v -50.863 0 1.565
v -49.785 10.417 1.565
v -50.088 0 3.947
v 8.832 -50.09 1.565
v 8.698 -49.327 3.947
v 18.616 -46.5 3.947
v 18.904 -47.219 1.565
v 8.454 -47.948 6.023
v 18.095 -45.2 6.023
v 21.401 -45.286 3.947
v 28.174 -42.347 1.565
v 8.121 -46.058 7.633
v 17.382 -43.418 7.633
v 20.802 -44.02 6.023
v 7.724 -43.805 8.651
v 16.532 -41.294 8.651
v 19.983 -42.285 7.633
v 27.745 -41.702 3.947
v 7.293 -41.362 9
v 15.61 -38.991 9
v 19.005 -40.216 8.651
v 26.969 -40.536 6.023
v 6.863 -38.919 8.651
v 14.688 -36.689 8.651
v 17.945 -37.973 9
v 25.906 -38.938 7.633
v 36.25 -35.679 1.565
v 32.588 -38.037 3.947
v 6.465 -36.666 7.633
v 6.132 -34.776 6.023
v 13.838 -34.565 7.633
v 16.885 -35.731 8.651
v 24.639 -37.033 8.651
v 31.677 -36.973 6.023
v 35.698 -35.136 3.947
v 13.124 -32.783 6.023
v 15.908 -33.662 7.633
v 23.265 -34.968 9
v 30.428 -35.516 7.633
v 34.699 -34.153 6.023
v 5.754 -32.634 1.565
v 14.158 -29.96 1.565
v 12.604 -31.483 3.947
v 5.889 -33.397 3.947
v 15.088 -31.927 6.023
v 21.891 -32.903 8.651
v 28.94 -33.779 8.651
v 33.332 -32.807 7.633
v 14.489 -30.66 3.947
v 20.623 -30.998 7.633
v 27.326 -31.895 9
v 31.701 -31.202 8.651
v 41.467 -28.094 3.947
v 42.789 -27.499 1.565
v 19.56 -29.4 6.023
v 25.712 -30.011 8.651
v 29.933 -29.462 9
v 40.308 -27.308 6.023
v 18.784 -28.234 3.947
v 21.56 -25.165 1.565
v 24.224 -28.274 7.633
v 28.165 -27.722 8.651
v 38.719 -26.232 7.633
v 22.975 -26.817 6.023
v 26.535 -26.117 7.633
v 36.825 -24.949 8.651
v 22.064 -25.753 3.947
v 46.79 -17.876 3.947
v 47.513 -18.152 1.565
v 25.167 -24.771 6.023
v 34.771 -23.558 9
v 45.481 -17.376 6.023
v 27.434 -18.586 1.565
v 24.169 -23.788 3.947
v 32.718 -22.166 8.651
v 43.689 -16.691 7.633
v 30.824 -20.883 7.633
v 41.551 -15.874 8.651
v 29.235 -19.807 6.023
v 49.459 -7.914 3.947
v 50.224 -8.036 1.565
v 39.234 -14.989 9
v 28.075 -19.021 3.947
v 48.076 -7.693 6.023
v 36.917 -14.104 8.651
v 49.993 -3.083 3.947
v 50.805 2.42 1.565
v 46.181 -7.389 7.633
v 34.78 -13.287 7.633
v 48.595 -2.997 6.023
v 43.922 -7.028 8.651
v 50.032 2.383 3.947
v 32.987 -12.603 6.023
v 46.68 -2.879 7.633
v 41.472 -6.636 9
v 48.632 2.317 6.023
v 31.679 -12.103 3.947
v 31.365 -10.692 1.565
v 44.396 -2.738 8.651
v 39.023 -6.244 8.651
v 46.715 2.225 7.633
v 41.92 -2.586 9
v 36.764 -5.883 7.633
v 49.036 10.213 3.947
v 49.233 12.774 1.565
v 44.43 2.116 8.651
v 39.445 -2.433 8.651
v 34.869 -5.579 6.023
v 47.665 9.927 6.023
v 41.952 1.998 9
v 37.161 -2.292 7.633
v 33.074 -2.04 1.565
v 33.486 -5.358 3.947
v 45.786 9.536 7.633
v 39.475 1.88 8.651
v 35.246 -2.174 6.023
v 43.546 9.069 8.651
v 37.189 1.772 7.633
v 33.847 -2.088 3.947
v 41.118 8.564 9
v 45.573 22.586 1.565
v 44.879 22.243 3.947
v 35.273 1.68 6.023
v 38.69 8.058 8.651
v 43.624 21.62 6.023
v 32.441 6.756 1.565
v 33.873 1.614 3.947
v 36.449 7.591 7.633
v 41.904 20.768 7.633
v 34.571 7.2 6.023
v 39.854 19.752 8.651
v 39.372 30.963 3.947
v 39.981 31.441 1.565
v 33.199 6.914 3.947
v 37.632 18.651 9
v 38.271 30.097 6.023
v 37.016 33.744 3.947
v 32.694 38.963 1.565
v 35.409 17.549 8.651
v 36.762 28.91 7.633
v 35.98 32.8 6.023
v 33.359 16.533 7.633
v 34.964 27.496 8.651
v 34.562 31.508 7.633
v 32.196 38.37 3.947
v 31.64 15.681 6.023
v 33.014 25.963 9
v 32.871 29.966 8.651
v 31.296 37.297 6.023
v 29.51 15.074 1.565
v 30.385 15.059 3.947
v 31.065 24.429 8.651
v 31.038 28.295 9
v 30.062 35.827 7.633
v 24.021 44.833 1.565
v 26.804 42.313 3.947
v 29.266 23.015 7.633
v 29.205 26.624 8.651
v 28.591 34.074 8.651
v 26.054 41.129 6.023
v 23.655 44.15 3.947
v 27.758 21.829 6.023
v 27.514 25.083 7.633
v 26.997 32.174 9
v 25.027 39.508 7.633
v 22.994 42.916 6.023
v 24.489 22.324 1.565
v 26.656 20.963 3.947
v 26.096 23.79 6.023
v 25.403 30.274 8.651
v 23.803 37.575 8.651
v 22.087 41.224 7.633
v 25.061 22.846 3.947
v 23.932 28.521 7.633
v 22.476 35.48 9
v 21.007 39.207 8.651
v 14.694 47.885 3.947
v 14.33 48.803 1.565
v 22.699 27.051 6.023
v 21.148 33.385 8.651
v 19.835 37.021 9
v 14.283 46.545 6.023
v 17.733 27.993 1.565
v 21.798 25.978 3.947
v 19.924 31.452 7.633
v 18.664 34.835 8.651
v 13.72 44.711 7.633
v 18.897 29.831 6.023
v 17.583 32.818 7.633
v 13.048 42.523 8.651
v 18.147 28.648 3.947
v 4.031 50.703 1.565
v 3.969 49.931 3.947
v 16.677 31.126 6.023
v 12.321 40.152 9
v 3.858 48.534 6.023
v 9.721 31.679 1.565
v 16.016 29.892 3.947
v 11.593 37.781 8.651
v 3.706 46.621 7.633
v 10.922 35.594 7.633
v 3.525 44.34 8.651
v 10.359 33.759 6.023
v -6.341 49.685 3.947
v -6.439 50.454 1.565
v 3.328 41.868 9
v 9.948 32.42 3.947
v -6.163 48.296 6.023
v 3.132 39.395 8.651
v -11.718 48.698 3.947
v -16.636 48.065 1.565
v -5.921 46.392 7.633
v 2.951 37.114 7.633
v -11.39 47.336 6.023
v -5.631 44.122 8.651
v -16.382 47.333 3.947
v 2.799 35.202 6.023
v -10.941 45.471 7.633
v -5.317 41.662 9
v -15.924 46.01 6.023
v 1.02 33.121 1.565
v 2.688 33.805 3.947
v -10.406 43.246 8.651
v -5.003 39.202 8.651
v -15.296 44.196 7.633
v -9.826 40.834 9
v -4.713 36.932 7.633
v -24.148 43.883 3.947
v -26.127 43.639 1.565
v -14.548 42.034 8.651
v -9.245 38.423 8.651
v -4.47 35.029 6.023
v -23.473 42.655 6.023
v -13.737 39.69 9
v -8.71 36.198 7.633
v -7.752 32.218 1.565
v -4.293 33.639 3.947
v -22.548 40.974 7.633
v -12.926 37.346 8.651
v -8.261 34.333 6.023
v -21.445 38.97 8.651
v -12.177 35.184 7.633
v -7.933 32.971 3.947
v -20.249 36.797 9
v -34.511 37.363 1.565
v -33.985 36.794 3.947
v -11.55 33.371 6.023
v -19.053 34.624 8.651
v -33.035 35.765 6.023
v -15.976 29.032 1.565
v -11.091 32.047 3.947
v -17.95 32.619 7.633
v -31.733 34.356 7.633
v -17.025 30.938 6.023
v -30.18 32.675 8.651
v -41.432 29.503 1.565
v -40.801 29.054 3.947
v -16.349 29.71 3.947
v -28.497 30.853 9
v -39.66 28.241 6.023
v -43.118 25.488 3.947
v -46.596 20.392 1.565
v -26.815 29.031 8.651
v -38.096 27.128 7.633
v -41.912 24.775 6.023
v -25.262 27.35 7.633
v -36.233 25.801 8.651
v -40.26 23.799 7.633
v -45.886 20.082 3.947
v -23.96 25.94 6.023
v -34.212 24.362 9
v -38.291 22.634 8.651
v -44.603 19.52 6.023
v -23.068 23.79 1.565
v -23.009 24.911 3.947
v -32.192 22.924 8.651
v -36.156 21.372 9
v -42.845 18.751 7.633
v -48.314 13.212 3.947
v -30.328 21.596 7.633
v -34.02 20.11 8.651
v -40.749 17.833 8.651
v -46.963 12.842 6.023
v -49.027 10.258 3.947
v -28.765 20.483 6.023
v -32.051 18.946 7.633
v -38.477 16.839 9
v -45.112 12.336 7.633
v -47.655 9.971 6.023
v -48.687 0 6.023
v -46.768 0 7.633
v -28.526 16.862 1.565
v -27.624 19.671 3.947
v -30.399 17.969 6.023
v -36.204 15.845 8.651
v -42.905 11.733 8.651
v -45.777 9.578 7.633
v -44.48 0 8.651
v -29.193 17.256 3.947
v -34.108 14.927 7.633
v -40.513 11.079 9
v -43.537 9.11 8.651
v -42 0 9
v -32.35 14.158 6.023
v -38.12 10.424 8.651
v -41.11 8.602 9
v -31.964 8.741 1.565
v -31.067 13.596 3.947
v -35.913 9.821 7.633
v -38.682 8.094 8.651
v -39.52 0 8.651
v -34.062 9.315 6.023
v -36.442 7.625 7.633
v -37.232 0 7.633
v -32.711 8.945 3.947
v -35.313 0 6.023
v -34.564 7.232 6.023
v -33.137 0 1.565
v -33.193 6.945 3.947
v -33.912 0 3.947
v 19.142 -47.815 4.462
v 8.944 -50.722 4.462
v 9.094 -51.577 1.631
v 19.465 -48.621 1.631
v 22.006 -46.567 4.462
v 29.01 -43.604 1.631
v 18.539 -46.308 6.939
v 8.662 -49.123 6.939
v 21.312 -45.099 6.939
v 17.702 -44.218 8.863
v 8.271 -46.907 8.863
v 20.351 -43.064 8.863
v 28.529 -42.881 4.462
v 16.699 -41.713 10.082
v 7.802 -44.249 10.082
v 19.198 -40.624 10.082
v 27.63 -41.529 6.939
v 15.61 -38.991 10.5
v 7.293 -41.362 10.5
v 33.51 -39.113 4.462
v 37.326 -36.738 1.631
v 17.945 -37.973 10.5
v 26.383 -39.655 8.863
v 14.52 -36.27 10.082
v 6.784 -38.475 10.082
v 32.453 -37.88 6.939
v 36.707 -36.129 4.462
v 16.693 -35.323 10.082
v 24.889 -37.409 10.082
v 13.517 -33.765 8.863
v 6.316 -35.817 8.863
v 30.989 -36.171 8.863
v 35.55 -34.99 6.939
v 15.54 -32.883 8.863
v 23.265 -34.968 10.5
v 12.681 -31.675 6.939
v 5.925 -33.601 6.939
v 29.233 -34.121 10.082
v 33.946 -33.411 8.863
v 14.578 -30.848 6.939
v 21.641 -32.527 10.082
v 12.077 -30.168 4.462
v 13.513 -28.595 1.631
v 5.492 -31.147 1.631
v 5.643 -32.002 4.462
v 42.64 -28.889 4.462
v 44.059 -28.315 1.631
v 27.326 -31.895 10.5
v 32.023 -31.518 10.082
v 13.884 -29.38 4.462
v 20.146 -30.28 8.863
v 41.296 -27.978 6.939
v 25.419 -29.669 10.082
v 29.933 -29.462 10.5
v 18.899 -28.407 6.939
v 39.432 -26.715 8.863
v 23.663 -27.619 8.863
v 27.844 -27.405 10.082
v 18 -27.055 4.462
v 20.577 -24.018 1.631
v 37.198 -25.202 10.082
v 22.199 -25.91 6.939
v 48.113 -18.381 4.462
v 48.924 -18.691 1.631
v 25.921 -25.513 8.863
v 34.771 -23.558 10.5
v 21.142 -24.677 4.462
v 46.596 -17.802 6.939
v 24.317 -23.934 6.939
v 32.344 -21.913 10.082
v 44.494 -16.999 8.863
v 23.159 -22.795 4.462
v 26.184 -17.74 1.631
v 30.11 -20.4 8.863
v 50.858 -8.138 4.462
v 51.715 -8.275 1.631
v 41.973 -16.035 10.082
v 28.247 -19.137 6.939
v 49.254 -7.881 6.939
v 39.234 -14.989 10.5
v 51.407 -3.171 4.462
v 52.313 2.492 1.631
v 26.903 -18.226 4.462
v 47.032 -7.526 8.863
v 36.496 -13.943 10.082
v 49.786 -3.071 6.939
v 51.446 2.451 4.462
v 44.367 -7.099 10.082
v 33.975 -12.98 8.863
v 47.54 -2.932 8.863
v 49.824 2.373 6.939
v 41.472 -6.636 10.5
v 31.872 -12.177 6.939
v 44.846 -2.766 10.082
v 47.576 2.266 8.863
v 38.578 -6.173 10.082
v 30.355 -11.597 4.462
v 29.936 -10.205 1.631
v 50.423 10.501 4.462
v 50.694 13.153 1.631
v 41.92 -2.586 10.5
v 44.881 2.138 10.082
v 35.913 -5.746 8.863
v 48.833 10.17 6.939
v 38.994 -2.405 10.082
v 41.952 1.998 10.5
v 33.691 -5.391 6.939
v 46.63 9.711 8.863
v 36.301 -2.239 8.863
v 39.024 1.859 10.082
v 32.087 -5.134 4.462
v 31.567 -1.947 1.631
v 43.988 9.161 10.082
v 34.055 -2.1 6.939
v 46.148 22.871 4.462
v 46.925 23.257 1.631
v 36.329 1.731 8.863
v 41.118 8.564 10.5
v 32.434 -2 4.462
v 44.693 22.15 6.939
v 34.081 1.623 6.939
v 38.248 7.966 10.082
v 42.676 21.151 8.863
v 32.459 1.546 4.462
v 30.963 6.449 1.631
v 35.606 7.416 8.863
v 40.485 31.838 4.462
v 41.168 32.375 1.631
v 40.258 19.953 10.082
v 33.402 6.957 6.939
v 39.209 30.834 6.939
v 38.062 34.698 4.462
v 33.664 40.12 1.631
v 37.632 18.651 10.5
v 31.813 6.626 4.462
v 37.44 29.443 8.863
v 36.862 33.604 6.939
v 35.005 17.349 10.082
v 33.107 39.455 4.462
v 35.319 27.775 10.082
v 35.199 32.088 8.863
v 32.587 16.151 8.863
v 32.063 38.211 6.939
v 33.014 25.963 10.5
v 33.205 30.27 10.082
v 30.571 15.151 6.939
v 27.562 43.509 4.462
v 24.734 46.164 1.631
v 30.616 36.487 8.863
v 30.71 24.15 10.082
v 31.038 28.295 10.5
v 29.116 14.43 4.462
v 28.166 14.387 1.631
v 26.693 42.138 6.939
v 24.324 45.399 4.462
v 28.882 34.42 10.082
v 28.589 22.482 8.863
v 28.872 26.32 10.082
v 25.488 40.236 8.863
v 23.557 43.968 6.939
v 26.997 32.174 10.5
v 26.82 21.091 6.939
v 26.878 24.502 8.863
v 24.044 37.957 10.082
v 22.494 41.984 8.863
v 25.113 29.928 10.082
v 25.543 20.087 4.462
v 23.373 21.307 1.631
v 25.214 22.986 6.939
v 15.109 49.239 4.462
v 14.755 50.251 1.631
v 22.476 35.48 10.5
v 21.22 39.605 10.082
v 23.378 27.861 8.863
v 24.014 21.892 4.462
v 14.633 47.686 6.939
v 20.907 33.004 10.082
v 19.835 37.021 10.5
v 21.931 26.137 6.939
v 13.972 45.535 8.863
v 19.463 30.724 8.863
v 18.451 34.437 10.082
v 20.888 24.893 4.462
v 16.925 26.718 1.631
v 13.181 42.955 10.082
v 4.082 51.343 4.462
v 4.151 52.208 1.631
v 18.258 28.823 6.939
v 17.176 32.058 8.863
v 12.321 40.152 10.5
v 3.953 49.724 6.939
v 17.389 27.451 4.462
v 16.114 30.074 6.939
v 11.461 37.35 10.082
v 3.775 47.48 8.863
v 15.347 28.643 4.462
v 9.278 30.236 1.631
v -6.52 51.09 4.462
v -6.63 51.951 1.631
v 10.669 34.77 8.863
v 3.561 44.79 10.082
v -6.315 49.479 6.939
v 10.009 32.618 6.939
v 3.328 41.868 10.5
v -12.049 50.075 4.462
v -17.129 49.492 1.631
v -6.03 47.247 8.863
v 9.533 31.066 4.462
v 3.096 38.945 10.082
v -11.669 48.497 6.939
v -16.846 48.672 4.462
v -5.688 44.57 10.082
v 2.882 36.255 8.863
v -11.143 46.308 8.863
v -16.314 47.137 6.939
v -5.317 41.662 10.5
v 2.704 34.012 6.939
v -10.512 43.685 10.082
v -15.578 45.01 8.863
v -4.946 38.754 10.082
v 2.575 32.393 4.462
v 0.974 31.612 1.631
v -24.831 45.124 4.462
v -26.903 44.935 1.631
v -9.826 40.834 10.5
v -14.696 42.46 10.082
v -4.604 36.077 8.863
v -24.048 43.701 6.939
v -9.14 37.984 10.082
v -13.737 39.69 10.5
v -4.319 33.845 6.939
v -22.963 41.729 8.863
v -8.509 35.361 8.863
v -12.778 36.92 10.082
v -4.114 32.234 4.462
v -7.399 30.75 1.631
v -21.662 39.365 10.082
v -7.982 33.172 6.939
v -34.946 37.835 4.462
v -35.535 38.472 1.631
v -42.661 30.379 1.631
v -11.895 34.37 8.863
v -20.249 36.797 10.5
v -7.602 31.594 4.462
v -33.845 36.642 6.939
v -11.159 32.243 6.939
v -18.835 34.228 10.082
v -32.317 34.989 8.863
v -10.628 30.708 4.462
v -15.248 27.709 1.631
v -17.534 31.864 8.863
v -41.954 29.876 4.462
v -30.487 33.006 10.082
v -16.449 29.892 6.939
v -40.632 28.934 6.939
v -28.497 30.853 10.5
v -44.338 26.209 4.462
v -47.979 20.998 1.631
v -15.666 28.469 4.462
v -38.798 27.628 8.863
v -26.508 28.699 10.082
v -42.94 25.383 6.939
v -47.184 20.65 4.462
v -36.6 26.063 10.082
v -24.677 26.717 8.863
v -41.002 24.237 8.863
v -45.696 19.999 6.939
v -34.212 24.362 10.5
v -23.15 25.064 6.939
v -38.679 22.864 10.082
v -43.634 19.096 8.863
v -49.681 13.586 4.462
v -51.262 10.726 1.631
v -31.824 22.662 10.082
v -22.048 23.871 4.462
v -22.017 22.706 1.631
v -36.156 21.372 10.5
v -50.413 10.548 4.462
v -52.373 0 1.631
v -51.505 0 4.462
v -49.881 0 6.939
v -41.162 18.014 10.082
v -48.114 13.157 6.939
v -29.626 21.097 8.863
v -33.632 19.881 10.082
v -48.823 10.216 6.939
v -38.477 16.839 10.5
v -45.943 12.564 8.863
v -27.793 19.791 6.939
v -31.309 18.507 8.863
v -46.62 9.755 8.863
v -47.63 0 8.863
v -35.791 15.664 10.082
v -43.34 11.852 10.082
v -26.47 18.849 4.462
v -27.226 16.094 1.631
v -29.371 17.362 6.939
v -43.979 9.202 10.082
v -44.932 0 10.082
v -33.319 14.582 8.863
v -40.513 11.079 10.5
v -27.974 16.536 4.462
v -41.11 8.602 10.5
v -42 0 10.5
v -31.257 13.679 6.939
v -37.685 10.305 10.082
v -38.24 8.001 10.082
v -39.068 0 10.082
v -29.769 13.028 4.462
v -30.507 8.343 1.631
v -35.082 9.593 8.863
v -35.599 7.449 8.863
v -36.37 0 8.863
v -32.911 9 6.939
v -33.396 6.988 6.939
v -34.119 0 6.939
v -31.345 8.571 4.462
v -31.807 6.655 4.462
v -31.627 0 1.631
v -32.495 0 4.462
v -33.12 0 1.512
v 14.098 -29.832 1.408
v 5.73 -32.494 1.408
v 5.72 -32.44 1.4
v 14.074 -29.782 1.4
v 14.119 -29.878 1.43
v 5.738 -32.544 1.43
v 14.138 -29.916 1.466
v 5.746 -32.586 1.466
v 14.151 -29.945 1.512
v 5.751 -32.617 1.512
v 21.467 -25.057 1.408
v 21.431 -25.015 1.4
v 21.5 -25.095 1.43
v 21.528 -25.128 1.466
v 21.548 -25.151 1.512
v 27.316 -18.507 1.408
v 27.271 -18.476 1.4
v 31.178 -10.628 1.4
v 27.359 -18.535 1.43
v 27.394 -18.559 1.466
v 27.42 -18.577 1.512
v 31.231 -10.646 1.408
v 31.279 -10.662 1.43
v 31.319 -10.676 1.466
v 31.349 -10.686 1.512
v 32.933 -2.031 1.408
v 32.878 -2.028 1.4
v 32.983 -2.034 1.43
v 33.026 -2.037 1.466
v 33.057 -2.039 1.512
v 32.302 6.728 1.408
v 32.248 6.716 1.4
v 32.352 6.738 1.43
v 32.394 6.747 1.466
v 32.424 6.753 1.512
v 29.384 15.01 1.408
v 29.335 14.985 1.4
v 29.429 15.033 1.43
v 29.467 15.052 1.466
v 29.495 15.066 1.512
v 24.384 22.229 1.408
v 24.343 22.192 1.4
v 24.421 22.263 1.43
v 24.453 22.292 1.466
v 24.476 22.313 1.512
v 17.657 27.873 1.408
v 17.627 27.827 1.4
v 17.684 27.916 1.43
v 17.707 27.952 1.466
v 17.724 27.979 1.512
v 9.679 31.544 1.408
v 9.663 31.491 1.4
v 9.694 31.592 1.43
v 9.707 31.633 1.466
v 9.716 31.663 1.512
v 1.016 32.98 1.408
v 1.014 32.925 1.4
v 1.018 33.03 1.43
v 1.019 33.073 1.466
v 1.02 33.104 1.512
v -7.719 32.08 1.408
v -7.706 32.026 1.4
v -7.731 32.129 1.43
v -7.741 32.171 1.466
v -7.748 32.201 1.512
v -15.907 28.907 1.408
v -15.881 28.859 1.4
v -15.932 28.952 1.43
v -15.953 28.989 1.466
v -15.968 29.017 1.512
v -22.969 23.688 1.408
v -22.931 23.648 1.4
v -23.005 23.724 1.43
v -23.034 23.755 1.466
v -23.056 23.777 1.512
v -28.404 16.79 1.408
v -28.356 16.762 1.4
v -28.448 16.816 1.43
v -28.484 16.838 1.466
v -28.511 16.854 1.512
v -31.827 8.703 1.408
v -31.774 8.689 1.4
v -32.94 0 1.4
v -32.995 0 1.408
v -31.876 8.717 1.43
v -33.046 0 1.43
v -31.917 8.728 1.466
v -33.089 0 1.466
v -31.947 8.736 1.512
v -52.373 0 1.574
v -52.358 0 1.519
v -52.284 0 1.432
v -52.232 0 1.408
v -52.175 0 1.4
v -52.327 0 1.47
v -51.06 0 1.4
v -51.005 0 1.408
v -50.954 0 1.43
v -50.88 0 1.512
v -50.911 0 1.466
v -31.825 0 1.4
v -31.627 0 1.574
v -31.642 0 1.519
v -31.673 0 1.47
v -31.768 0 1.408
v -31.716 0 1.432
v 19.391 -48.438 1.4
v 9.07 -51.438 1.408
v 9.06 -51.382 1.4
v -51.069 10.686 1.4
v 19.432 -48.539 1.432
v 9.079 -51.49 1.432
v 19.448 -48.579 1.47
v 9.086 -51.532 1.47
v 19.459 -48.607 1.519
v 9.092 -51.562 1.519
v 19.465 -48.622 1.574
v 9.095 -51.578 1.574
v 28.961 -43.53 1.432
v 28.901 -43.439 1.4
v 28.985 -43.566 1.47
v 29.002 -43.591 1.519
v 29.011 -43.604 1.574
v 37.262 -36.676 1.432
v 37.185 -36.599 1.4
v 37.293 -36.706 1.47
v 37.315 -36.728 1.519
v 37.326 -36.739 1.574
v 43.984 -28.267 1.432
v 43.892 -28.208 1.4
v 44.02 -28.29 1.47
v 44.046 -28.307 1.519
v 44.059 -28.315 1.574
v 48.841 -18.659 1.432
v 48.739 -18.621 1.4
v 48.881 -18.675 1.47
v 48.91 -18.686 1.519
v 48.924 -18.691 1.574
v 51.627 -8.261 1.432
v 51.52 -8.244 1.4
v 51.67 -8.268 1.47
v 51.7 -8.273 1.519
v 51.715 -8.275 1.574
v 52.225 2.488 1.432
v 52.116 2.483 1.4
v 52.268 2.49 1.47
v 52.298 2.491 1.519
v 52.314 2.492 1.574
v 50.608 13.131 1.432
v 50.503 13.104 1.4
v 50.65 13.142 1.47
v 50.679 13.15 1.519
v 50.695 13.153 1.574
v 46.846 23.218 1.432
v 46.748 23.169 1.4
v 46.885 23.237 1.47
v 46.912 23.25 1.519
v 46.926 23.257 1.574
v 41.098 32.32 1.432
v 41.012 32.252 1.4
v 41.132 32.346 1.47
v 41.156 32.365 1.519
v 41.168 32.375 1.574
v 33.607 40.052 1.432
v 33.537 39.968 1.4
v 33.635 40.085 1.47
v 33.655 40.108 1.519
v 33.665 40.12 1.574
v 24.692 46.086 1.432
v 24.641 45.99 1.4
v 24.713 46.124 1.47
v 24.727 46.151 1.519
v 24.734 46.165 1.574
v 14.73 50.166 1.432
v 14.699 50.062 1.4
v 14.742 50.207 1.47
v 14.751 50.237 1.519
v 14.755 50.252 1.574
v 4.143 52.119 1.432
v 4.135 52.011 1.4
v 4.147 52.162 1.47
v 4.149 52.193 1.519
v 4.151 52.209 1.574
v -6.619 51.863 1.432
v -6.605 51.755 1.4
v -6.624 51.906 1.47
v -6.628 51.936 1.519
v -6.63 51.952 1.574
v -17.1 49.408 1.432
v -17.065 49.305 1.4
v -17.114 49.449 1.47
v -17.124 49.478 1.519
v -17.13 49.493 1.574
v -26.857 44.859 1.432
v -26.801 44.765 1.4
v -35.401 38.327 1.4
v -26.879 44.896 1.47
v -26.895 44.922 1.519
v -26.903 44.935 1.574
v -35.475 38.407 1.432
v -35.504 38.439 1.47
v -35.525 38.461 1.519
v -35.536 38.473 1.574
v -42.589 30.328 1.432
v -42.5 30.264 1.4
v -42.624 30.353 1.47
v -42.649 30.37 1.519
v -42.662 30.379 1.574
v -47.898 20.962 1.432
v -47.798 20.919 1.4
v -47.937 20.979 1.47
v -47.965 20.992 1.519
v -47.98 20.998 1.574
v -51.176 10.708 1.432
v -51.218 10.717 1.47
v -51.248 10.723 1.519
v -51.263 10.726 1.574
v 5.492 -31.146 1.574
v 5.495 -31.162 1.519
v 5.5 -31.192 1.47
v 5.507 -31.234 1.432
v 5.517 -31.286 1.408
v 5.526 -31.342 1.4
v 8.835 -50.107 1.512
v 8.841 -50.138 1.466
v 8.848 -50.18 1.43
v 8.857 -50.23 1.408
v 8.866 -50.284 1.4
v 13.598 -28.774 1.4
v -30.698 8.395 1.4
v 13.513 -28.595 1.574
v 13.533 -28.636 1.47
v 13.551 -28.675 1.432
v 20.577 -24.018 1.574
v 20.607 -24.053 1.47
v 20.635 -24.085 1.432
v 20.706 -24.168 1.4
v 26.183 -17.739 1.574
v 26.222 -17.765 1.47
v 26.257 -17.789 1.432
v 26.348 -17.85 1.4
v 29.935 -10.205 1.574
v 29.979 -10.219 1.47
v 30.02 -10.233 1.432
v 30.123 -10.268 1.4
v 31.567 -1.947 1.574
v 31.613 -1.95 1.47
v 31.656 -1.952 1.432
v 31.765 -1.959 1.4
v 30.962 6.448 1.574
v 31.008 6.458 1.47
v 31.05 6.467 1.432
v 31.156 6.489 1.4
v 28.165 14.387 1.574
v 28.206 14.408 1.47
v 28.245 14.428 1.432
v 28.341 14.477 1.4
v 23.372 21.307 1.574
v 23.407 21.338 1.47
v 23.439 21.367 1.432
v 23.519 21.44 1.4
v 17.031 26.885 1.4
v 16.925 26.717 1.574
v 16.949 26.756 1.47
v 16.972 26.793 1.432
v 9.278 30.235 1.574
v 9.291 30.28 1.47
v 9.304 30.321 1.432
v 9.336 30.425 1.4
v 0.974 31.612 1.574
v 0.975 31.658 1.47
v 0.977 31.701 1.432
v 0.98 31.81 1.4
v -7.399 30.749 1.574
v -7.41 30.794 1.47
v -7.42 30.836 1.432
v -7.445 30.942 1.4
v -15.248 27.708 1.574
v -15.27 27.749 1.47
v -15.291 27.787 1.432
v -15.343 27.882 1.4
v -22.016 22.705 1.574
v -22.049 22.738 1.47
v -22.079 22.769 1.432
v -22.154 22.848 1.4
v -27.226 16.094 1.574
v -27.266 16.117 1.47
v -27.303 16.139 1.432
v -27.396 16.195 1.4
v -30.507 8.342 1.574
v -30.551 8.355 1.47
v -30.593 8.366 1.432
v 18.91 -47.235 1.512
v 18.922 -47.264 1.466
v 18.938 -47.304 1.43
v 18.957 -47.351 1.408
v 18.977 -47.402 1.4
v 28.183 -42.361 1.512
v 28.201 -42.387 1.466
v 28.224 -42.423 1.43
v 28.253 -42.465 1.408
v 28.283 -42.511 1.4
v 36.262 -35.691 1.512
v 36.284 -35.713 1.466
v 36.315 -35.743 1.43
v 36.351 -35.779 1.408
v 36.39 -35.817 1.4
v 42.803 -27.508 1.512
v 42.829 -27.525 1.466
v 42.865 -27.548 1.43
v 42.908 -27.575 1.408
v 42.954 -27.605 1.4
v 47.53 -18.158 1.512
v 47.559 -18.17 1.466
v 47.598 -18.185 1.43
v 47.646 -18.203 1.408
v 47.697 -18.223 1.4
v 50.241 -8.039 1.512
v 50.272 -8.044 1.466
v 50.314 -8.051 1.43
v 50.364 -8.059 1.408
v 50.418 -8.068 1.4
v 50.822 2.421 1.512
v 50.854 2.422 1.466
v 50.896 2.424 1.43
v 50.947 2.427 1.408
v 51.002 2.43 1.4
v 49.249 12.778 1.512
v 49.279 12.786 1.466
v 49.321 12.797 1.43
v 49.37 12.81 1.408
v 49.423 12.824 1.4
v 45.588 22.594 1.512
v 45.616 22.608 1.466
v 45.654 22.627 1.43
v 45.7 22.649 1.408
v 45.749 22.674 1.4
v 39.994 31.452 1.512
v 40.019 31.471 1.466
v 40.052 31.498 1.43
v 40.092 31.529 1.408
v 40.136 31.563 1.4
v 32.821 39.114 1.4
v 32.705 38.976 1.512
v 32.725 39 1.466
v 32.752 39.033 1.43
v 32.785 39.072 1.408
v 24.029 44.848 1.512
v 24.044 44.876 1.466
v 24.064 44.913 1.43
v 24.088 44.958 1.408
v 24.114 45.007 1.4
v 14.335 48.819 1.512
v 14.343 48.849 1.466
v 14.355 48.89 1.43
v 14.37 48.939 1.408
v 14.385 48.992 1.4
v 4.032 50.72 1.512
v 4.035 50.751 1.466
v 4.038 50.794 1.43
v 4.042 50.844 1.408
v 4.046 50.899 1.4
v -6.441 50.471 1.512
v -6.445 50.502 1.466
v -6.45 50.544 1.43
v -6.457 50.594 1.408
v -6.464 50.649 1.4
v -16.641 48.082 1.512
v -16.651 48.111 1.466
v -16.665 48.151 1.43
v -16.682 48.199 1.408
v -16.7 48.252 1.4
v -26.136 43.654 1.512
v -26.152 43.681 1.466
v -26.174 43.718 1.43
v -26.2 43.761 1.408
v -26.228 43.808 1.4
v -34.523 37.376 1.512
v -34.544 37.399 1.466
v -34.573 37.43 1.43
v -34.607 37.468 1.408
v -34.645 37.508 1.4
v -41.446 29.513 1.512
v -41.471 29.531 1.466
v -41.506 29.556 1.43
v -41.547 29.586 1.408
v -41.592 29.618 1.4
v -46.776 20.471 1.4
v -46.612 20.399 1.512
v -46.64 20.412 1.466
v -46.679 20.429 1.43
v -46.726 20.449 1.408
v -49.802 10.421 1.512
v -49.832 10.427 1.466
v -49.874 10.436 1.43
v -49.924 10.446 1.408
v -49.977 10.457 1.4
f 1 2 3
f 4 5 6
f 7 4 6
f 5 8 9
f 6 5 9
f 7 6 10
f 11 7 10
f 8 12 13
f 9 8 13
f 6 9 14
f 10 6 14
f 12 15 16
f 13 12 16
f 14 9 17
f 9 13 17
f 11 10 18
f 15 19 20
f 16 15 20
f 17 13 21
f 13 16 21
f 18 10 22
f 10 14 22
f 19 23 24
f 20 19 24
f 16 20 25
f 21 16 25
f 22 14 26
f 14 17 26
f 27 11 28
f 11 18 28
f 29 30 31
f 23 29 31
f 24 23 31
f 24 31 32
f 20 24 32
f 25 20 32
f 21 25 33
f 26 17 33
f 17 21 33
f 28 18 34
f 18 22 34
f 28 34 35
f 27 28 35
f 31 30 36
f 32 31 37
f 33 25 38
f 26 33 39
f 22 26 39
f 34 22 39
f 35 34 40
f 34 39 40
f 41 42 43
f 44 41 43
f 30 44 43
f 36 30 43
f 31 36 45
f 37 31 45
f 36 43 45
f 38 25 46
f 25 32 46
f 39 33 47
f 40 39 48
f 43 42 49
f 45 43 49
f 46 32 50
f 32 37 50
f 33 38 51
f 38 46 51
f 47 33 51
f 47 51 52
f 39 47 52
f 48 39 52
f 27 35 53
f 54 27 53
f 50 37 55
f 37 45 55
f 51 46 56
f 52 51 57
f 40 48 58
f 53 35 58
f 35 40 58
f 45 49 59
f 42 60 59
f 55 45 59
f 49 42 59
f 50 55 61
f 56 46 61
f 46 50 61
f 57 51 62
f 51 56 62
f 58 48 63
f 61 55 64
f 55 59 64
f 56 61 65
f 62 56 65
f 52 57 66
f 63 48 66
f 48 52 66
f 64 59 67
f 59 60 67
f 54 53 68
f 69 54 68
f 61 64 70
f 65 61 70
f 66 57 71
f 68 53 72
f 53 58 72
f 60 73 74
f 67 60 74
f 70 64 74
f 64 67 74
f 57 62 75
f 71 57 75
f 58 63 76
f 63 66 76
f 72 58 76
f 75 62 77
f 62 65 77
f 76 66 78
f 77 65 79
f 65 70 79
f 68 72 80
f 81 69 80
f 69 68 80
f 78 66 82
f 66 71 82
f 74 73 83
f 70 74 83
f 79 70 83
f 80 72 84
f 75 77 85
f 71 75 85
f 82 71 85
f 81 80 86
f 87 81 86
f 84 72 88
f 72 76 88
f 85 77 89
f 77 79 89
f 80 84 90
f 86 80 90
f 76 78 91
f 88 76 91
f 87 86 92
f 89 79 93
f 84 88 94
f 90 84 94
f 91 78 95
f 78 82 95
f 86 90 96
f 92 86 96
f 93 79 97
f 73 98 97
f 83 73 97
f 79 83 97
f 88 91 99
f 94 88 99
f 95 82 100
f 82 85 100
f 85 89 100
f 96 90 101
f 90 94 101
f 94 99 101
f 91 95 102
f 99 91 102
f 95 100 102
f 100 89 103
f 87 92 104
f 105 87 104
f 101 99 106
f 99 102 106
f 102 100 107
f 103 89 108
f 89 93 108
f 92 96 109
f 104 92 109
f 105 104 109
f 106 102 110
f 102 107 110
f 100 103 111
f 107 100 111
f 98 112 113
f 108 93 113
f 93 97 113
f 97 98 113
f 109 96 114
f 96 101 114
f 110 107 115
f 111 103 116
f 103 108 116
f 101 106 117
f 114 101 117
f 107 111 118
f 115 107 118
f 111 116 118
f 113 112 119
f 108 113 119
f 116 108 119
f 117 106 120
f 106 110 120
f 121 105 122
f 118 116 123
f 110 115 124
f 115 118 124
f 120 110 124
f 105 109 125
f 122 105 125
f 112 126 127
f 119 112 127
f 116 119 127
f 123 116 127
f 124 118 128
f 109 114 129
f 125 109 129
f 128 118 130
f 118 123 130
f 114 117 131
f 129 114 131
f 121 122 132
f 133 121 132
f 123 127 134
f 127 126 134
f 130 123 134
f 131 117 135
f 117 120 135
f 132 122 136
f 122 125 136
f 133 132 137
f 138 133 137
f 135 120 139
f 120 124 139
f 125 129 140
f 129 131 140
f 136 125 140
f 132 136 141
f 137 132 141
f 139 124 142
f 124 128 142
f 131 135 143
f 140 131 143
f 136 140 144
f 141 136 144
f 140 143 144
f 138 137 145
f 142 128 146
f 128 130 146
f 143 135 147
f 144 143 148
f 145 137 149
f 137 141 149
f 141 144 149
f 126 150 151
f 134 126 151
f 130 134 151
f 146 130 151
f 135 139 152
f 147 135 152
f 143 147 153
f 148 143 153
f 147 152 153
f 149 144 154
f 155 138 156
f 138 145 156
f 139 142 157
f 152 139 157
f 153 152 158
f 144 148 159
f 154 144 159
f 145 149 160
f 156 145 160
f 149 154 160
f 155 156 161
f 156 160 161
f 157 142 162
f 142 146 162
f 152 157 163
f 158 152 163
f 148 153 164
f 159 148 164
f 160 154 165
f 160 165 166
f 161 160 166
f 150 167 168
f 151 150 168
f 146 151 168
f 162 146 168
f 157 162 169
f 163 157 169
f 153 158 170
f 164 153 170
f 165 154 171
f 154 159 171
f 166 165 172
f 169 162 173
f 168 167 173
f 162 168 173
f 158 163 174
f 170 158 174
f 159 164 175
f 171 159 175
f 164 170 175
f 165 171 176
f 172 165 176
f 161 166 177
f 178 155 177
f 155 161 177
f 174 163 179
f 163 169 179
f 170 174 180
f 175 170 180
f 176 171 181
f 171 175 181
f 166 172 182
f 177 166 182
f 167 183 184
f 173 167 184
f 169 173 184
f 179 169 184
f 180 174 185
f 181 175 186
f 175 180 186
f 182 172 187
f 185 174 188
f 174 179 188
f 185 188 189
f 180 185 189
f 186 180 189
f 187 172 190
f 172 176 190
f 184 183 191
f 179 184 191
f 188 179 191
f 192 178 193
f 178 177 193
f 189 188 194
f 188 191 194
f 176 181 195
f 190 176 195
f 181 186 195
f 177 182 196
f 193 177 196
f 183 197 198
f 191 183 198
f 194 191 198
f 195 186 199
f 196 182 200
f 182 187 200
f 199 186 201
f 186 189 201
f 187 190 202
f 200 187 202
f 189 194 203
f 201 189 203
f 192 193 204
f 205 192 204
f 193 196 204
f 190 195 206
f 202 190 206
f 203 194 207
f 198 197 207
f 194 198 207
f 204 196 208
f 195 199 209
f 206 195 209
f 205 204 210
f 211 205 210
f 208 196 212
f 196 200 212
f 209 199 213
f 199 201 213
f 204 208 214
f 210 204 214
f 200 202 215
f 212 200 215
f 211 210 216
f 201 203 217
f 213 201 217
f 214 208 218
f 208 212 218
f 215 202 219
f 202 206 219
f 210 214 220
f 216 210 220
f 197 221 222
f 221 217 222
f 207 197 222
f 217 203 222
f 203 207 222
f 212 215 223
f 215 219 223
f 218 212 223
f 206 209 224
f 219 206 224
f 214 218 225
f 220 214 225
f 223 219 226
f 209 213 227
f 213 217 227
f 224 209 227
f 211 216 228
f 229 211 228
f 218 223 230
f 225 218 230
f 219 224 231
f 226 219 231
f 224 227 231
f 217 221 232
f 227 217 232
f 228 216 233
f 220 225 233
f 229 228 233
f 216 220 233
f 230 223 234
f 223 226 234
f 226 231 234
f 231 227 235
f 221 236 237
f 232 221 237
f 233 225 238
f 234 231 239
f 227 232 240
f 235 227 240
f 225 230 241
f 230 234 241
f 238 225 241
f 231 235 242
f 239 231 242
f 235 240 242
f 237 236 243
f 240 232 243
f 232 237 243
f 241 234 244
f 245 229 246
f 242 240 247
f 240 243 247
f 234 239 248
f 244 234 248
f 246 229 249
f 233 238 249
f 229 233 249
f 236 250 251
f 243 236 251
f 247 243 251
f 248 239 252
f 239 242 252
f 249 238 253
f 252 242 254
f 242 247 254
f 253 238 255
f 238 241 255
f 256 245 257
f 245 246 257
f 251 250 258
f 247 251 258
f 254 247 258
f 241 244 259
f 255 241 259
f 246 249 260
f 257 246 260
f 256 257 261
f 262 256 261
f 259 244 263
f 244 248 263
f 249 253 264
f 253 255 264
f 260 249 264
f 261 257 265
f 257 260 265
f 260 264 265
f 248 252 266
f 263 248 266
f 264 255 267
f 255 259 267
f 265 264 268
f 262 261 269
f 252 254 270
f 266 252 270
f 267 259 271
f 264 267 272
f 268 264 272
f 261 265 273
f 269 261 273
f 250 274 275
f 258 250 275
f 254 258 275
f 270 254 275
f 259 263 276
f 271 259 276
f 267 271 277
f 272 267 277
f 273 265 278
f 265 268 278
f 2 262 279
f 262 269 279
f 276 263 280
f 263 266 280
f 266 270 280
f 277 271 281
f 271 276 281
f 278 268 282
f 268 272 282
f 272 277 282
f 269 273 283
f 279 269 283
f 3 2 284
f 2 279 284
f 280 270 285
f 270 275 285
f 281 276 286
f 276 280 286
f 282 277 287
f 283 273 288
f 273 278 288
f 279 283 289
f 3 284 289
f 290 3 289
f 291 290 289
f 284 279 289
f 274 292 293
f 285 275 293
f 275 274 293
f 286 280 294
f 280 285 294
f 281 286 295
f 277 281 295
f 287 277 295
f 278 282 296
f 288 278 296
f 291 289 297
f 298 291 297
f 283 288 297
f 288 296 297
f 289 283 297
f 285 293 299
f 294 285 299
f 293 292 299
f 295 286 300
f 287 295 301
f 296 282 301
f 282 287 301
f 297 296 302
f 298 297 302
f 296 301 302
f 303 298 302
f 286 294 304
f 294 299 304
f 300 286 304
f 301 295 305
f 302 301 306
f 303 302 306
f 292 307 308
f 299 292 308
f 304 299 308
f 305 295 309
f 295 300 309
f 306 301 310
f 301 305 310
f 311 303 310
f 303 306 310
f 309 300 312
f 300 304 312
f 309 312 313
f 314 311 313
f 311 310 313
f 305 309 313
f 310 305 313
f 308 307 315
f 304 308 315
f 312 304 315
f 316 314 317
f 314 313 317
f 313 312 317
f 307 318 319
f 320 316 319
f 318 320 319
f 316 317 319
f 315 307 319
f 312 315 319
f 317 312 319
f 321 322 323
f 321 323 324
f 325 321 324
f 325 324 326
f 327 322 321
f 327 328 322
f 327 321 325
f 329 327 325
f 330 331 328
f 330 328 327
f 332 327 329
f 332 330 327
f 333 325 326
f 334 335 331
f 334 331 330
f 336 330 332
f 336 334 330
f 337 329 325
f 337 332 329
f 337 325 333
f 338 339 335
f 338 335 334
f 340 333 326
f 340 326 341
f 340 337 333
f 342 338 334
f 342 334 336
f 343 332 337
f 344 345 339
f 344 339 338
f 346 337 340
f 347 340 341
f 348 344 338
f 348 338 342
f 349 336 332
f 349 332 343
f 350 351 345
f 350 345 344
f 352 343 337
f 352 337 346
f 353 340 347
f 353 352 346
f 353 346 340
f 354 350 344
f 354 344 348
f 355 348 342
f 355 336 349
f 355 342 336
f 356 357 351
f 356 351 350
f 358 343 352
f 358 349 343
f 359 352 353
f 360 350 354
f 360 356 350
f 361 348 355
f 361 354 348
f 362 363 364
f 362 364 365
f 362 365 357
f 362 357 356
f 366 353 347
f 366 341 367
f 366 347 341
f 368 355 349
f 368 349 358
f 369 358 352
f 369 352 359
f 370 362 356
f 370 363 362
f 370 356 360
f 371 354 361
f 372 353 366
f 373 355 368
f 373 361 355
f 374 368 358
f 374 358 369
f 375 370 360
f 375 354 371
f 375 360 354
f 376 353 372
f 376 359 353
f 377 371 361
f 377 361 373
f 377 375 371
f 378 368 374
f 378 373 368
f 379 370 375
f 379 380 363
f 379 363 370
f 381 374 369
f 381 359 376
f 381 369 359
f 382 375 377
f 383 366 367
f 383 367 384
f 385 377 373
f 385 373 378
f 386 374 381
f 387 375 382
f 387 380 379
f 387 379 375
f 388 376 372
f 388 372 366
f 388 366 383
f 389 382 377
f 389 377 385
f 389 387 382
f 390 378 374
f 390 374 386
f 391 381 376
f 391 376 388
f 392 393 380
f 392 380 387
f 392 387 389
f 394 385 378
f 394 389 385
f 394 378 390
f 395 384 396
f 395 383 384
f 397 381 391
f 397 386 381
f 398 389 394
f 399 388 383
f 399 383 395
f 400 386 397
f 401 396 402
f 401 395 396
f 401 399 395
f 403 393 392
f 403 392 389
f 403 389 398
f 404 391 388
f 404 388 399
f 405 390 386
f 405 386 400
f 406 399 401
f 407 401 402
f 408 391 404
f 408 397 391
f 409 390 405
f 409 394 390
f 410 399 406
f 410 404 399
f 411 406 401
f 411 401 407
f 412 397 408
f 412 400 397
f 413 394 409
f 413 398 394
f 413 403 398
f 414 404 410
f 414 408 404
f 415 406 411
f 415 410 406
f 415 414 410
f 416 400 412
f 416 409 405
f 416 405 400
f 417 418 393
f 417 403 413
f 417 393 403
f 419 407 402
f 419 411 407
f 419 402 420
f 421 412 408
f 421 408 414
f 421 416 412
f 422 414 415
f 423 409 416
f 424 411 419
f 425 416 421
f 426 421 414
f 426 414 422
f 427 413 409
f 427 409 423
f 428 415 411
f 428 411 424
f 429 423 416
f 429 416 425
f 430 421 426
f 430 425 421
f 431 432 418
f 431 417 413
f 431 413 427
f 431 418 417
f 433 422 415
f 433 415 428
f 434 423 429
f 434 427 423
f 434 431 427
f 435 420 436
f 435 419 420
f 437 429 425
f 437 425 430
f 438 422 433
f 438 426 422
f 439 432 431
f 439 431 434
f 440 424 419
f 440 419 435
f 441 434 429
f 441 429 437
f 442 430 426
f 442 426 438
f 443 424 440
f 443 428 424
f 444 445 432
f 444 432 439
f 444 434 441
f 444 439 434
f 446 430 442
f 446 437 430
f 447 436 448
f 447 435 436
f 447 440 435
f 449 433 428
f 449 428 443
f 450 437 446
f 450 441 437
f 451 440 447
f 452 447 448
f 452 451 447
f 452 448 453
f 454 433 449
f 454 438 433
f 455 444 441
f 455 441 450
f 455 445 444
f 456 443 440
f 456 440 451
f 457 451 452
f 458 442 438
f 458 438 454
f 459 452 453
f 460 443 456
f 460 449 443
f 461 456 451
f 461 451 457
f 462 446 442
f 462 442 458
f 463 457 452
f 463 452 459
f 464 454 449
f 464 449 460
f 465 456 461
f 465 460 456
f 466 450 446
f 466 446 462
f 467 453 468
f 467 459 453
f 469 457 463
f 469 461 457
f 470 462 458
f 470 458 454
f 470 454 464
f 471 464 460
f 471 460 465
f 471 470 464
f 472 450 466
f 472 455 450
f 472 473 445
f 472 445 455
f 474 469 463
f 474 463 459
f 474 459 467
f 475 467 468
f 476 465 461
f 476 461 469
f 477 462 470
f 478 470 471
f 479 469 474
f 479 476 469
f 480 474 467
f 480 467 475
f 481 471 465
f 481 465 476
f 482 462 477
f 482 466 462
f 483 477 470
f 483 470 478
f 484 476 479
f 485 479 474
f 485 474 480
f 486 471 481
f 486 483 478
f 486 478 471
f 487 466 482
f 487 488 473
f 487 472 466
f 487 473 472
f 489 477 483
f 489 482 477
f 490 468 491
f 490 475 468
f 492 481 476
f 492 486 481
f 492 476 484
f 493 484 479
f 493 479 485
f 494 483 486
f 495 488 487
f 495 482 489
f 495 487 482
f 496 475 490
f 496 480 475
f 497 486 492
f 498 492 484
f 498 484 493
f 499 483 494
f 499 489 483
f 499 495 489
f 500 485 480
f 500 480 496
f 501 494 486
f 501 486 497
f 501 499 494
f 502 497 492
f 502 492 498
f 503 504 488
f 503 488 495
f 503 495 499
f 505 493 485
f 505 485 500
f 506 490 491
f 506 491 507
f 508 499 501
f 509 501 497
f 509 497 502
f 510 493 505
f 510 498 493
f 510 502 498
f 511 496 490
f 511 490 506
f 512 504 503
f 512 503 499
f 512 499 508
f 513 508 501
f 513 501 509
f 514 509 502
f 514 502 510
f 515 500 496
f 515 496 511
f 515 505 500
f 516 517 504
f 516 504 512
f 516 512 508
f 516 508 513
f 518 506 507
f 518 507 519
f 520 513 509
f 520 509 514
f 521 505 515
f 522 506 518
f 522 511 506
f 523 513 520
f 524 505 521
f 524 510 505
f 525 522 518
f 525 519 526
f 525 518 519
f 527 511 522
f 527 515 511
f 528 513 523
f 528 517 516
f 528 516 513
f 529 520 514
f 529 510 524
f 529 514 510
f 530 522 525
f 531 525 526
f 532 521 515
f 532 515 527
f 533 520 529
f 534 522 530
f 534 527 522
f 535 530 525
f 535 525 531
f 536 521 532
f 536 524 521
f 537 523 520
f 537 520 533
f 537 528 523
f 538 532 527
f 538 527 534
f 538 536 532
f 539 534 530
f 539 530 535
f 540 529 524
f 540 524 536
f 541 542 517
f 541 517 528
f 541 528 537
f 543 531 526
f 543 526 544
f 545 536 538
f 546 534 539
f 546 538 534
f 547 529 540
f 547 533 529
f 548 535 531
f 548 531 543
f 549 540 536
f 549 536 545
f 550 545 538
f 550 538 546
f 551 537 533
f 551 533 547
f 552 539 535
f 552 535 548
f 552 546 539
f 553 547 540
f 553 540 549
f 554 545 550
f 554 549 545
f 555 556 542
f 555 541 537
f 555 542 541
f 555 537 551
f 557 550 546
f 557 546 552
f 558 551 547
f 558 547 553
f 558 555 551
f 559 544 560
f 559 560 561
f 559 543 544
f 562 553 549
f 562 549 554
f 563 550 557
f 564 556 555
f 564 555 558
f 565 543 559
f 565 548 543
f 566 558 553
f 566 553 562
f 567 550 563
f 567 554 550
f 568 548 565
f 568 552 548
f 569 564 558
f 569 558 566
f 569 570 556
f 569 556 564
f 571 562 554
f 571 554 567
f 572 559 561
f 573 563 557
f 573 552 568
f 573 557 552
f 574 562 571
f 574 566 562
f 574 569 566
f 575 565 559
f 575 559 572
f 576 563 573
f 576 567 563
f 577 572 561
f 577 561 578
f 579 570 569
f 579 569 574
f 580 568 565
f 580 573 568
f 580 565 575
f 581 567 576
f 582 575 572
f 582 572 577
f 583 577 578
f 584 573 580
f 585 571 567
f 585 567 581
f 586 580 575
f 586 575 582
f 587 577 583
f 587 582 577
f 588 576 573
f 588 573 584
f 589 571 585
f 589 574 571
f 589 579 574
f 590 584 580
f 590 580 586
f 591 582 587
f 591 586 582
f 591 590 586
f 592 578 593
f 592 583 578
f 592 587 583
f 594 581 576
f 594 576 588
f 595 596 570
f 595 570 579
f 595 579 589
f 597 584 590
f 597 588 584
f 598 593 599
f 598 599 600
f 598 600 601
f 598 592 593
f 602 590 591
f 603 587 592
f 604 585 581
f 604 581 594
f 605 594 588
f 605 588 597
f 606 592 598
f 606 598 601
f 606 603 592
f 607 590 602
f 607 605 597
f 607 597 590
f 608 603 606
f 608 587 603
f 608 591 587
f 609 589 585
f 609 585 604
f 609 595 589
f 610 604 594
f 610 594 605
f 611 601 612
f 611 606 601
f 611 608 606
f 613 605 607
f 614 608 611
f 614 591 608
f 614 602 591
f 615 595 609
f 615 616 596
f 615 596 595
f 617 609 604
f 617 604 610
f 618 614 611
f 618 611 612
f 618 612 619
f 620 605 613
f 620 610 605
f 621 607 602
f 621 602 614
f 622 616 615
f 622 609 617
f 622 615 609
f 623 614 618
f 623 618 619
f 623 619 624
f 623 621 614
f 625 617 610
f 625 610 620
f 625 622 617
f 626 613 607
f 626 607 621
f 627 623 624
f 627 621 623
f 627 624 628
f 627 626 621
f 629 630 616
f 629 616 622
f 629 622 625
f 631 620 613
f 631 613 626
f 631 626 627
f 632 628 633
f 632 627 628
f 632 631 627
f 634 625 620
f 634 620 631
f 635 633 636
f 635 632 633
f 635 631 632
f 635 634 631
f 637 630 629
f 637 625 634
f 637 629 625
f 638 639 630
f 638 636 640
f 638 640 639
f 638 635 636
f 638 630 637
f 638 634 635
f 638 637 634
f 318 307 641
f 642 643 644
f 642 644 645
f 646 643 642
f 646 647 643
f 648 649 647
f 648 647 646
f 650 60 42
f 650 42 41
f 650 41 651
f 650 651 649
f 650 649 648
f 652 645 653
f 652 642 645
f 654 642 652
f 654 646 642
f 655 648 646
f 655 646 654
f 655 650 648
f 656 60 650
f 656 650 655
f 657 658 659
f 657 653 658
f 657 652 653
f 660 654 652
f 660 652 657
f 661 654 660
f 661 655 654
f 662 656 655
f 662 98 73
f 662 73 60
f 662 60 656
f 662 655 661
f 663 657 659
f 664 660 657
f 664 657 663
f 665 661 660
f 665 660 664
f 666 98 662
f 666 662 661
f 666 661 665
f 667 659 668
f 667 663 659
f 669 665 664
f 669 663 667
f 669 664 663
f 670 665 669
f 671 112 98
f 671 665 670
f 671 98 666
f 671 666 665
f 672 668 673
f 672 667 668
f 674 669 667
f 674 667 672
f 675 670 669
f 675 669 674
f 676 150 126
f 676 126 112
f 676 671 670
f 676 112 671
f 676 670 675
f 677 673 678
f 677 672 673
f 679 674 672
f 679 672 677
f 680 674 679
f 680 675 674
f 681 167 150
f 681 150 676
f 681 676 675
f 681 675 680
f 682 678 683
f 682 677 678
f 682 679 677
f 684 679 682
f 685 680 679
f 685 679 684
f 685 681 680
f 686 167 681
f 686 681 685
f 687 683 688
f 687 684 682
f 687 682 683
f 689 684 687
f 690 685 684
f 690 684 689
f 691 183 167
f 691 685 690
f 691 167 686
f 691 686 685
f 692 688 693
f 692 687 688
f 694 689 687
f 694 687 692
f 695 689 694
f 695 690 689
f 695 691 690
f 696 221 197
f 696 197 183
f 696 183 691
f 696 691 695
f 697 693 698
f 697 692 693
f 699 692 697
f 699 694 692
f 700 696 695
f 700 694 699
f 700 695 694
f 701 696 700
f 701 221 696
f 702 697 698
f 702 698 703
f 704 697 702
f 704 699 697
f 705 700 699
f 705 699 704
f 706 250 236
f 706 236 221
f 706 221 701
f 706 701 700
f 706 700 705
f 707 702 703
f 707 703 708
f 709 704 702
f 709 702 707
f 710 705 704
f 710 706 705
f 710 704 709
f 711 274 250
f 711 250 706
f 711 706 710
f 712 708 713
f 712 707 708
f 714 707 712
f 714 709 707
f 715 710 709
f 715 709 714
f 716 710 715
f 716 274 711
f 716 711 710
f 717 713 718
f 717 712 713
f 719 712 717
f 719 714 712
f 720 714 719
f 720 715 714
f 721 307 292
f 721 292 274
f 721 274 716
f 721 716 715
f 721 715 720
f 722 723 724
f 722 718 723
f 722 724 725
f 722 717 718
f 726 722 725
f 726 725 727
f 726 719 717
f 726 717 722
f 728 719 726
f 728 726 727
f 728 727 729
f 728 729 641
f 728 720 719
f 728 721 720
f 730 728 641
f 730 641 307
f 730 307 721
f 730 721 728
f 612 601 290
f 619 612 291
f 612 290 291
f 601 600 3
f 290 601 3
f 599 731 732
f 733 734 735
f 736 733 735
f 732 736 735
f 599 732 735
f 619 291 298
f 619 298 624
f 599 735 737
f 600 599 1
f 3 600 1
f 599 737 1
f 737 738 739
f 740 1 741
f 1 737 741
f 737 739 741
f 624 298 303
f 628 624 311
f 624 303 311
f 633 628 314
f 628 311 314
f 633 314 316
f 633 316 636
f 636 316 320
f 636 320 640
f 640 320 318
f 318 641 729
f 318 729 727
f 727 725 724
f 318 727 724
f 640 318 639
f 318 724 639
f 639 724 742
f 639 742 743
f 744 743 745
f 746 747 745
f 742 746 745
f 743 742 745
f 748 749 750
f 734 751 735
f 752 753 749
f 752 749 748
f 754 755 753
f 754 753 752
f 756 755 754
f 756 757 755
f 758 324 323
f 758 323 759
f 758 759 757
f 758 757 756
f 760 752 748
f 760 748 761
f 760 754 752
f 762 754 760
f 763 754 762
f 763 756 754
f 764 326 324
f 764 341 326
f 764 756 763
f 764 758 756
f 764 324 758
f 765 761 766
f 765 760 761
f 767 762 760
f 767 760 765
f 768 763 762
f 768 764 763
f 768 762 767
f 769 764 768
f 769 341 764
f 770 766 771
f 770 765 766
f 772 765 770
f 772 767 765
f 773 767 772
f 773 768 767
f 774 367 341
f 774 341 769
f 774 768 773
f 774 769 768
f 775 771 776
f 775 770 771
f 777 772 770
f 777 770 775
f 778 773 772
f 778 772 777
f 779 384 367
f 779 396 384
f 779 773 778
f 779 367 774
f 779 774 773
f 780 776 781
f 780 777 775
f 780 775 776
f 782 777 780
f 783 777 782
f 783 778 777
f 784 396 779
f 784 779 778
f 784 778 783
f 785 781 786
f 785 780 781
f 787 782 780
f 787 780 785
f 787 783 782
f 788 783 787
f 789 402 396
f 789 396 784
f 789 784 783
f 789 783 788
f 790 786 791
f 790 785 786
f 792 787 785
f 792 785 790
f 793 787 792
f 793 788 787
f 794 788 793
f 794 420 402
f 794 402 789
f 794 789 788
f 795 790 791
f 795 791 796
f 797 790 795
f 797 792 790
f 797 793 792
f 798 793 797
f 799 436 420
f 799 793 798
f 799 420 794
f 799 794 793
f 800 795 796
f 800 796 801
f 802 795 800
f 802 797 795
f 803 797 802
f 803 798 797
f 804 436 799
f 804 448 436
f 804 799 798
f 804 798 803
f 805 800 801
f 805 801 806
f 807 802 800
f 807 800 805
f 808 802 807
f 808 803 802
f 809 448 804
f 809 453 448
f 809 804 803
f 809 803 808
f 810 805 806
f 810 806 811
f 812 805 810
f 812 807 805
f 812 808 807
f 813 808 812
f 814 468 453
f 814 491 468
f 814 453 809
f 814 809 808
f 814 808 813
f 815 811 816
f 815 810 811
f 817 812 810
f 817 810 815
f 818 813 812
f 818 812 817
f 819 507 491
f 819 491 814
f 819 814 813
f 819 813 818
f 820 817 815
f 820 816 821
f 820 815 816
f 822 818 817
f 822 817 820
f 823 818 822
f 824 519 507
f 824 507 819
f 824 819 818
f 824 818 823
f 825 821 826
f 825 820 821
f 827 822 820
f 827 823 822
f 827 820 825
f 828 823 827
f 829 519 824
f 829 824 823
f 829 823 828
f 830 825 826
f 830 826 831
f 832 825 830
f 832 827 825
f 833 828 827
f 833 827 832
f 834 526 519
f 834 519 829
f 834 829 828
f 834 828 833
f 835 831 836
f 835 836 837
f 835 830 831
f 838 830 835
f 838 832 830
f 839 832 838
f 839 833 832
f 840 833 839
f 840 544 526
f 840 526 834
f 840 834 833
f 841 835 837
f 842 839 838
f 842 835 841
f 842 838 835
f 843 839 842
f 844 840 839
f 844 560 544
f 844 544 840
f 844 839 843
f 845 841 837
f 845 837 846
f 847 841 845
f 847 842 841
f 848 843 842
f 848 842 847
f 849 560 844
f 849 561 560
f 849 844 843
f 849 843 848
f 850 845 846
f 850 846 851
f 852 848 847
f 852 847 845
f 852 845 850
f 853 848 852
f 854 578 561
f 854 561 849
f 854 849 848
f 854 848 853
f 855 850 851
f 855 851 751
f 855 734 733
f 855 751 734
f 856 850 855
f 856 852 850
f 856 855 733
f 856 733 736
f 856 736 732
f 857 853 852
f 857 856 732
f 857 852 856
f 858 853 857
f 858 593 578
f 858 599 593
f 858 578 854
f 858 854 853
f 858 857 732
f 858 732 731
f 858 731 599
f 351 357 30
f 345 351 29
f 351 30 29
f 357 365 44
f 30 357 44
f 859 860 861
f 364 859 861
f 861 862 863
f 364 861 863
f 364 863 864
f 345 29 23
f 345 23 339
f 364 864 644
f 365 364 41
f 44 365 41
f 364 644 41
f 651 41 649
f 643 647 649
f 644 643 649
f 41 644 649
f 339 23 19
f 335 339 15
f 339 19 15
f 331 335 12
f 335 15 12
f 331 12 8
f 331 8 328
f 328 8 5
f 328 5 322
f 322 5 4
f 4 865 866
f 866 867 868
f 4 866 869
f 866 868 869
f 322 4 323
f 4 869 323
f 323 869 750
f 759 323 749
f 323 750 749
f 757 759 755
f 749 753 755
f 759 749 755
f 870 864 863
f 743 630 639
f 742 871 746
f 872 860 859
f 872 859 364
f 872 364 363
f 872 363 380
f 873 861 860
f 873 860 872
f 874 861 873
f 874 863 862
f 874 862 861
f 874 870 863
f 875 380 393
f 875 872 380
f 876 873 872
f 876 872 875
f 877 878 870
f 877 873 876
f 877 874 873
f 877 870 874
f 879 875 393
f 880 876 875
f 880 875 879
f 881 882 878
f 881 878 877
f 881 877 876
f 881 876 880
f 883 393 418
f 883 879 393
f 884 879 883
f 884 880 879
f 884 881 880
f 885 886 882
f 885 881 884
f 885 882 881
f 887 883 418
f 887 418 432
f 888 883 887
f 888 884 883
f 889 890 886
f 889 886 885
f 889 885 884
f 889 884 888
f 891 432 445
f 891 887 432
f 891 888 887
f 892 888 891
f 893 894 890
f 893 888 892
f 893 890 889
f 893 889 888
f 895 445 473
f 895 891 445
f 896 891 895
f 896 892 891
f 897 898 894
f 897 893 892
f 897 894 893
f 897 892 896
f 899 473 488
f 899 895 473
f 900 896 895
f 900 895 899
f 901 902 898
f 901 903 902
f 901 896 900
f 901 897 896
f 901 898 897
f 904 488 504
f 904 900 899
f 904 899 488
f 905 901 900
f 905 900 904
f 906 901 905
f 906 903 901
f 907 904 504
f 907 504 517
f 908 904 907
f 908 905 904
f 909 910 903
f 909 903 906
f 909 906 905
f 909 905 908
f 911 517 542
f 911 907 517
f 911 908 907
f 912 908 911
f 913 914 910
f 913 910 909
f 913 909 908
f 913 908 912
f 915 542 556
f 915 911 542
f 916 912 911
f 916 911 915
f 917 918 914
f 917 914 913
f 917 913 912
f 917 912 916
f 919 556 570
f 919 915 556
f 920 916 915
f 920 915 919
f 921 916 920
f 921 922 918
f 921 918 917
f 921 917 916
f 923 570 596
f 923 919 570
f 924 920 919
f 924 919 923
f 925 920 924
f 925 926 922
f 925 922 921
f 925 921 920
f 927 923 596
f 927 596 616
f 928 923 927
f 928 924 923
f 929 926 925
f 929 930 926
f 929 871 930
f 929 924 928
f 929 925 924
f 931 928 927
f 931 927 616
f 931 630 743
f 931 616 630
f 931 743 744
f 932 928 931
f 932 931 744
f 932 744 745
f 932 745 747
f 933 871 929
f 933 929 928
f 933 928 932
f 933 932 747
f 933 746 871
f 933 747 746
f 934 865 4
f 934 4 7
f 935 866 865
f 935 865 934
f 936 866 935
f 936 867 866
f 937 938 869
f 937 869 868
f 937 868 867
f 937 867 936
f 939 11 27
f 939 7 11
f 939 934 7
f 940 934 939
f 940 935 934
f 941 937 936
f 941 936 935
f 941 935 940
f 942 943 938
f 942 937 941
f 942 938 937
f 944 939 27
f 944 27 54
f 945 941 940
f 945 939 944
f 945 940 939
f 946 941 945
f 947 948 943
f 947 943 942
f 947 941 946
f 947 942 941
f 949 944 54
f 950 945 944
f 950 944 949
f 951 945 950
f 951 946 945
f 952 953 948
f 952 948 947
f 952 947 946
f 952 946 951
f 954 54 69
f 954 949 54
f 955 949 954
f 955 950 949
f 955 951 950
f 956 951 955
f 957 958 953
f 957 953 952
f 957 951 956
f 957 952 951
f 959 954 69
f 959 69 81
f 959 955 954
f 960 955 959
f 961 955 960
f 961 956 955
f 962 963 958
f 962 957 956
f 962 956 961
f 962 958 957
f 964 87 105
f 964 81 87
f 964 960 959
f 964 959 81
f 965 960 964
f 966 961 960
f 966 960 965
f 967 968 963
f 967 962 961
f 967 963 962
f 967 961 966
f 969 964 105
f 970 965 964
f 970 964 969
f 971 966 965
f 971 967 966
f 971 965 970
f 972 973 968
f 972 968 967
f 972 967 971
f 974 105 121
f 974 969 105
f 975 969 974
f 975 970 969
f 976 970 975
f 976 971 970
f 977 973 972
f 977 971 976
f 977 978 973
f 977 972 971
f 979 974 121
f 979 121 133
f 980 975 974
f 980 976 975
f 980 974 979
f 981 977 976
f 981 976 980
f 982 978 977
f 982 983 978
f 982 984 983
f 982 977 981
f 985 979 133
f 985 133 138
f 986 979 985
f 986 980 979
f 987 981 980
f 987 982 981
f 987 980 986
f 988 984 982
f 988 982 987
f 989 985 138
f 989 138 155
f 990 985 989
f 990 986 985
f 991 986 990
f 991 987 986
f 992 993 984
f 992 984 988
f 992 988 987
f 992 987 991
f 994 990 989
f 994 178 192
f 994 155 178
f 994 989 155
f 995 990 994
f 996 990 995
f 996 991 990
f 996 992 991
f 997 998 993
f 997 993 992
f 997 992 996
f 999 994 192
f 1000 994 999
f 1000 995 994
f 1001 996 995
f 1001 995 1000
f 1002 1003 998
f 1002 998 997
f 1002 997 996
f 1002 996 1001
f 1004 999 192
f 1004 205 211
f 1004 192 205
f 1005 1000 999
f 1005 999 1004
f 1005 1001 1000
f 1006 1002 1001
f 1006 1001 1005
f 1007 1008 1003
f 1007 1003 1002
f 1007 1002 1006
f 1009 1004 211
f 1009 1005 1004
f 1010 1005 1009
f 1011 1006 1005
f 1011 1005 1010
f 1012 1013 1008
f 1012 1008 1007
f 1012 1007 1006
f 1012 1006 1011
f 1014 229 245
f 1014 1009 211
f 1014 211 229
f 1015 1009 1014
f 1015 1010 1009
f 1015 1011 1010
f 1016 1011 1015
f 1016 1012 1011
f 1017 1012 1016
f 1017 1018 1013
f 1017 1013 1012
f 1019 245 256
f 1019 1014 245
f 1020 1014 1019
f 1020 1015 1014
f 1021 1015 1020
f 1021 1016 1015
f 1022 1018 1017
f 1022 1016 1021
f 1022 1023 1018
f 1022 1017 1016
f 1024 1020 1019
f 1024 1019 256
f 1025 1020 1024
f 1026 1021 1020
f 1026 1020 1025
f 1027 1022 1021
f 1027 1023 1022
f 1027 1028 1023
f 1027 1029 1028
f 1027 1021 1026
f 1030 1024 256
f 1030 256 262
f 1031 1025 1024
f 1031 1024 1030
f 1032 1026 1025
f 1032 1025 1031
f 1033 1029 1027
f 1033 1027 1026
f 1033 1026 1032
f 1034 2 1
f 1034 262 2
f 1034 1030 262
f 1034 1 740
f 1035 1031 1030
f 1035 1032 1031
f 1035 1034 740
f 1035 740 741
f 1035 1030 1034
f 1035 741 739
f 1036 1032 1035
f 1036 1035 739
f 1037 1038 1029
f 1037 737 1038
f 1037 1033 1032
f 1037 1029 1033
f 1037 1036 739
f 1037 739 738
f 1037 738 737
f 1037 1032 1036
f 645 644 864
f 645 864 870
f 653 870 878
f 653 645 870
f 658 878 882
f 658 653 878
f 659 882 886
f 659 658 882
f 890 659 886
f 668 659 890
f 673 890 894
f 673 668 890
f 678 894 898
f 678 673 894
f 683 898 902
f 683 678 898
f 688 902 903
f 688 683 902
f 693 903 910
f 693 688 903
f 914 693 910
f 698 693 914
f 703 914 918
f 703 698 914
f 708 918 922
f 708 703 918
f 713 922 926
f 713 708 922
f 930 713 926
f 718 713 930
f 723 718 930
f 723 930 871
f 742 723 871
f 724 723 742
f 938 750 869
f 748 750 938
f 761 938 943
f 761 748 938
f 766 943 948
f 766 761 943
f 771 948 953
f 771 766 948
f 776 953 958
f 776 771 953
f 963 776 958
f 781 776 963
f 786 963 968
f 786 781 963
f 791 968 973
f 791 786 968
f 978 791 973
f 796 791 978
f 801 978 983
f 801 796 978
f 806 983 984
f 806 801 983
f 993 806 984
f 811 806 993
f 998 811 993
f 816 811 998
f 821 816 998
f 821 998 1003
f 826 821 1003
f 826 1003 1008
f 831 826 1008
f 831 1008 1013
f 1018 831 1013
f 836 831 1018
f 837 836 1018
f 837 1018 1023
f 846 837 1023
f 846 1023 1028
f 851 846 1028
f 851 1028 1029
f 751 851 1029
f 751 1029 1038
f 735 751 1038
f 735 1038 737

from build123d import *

# Parameters (mm, degrees)
CUTOUT_DEPTH      = 11.5000001
CUTOUT_DEPTH_BACK = 1


with BuildPart() as part:
    # Main Belt: sweep along a path in Belt Path
    with BuildLine(Plane.XY) as main_belt_path:
        CenterArc((0, 0), 42, 0, 360)
    # Belt Profile → Main Belt (sweep)
    with BuildSketch(Plane(origin=(0, 0, 0), x_dir=(1, 0, 0), z_dir=(0, 1, 0))):
        with BuildLine():
            Line((-32.940198678, -1.4), (-31.825030713, -1.4))
            ThreePointArc((-31.825030713, -1.4), (-31.673021515, -1.470026142), (-31.627458493, -1.631067961))
            ThreePointArc((-31.627458493, -1.631067961), (-42, -10.5), (-52.372541507, -1.631067961))
            ThreePointArc((-52.372541507, -1.631067961), (-52.326978485, -1.470026142), (-52.174969287, -1.4))
            Line((-52.174969287, -1.4), (-51.059801322, -1.4))
            ThreePointArc((-51.059801322, -1.4), (-50.931264405, -1.446773824), (-50.86284912, -1.565217391))
            ThreePointArc((-50.86284912, -1.565217391), (-42, -9), (-33.13715088, -1.565217391))
            ThreePointArc((-33.13715088, -1.565217391), (-33.068735595, -1.446773824), (-32.940198678, -1.4))
        make_face()
    sweep(path=main_belt_path.line)

    # Test Cutout Sketch → Cutout (cut, two sides)
    with BuildSketch(Plane.XY) as cutout_sk:
        with BuildLine():
            Line((0, 0), (10.41889066, -59.088465181))
            ThreePointArc((10.41889066, -59.088465181), (-38.567256581, -45.962666587), (-60, 0))
            Line((-60, 0), (0, 0))
        make_face()
    extrude(amount=CUTOUT_DEPTH, mode=Mode.SUBTRACT)
    extrude(cutout_sk.sketch, amount=-CUTOUT_DEPTH_BACK, mode=Mode.SUBTRACT)


solid = part.part
